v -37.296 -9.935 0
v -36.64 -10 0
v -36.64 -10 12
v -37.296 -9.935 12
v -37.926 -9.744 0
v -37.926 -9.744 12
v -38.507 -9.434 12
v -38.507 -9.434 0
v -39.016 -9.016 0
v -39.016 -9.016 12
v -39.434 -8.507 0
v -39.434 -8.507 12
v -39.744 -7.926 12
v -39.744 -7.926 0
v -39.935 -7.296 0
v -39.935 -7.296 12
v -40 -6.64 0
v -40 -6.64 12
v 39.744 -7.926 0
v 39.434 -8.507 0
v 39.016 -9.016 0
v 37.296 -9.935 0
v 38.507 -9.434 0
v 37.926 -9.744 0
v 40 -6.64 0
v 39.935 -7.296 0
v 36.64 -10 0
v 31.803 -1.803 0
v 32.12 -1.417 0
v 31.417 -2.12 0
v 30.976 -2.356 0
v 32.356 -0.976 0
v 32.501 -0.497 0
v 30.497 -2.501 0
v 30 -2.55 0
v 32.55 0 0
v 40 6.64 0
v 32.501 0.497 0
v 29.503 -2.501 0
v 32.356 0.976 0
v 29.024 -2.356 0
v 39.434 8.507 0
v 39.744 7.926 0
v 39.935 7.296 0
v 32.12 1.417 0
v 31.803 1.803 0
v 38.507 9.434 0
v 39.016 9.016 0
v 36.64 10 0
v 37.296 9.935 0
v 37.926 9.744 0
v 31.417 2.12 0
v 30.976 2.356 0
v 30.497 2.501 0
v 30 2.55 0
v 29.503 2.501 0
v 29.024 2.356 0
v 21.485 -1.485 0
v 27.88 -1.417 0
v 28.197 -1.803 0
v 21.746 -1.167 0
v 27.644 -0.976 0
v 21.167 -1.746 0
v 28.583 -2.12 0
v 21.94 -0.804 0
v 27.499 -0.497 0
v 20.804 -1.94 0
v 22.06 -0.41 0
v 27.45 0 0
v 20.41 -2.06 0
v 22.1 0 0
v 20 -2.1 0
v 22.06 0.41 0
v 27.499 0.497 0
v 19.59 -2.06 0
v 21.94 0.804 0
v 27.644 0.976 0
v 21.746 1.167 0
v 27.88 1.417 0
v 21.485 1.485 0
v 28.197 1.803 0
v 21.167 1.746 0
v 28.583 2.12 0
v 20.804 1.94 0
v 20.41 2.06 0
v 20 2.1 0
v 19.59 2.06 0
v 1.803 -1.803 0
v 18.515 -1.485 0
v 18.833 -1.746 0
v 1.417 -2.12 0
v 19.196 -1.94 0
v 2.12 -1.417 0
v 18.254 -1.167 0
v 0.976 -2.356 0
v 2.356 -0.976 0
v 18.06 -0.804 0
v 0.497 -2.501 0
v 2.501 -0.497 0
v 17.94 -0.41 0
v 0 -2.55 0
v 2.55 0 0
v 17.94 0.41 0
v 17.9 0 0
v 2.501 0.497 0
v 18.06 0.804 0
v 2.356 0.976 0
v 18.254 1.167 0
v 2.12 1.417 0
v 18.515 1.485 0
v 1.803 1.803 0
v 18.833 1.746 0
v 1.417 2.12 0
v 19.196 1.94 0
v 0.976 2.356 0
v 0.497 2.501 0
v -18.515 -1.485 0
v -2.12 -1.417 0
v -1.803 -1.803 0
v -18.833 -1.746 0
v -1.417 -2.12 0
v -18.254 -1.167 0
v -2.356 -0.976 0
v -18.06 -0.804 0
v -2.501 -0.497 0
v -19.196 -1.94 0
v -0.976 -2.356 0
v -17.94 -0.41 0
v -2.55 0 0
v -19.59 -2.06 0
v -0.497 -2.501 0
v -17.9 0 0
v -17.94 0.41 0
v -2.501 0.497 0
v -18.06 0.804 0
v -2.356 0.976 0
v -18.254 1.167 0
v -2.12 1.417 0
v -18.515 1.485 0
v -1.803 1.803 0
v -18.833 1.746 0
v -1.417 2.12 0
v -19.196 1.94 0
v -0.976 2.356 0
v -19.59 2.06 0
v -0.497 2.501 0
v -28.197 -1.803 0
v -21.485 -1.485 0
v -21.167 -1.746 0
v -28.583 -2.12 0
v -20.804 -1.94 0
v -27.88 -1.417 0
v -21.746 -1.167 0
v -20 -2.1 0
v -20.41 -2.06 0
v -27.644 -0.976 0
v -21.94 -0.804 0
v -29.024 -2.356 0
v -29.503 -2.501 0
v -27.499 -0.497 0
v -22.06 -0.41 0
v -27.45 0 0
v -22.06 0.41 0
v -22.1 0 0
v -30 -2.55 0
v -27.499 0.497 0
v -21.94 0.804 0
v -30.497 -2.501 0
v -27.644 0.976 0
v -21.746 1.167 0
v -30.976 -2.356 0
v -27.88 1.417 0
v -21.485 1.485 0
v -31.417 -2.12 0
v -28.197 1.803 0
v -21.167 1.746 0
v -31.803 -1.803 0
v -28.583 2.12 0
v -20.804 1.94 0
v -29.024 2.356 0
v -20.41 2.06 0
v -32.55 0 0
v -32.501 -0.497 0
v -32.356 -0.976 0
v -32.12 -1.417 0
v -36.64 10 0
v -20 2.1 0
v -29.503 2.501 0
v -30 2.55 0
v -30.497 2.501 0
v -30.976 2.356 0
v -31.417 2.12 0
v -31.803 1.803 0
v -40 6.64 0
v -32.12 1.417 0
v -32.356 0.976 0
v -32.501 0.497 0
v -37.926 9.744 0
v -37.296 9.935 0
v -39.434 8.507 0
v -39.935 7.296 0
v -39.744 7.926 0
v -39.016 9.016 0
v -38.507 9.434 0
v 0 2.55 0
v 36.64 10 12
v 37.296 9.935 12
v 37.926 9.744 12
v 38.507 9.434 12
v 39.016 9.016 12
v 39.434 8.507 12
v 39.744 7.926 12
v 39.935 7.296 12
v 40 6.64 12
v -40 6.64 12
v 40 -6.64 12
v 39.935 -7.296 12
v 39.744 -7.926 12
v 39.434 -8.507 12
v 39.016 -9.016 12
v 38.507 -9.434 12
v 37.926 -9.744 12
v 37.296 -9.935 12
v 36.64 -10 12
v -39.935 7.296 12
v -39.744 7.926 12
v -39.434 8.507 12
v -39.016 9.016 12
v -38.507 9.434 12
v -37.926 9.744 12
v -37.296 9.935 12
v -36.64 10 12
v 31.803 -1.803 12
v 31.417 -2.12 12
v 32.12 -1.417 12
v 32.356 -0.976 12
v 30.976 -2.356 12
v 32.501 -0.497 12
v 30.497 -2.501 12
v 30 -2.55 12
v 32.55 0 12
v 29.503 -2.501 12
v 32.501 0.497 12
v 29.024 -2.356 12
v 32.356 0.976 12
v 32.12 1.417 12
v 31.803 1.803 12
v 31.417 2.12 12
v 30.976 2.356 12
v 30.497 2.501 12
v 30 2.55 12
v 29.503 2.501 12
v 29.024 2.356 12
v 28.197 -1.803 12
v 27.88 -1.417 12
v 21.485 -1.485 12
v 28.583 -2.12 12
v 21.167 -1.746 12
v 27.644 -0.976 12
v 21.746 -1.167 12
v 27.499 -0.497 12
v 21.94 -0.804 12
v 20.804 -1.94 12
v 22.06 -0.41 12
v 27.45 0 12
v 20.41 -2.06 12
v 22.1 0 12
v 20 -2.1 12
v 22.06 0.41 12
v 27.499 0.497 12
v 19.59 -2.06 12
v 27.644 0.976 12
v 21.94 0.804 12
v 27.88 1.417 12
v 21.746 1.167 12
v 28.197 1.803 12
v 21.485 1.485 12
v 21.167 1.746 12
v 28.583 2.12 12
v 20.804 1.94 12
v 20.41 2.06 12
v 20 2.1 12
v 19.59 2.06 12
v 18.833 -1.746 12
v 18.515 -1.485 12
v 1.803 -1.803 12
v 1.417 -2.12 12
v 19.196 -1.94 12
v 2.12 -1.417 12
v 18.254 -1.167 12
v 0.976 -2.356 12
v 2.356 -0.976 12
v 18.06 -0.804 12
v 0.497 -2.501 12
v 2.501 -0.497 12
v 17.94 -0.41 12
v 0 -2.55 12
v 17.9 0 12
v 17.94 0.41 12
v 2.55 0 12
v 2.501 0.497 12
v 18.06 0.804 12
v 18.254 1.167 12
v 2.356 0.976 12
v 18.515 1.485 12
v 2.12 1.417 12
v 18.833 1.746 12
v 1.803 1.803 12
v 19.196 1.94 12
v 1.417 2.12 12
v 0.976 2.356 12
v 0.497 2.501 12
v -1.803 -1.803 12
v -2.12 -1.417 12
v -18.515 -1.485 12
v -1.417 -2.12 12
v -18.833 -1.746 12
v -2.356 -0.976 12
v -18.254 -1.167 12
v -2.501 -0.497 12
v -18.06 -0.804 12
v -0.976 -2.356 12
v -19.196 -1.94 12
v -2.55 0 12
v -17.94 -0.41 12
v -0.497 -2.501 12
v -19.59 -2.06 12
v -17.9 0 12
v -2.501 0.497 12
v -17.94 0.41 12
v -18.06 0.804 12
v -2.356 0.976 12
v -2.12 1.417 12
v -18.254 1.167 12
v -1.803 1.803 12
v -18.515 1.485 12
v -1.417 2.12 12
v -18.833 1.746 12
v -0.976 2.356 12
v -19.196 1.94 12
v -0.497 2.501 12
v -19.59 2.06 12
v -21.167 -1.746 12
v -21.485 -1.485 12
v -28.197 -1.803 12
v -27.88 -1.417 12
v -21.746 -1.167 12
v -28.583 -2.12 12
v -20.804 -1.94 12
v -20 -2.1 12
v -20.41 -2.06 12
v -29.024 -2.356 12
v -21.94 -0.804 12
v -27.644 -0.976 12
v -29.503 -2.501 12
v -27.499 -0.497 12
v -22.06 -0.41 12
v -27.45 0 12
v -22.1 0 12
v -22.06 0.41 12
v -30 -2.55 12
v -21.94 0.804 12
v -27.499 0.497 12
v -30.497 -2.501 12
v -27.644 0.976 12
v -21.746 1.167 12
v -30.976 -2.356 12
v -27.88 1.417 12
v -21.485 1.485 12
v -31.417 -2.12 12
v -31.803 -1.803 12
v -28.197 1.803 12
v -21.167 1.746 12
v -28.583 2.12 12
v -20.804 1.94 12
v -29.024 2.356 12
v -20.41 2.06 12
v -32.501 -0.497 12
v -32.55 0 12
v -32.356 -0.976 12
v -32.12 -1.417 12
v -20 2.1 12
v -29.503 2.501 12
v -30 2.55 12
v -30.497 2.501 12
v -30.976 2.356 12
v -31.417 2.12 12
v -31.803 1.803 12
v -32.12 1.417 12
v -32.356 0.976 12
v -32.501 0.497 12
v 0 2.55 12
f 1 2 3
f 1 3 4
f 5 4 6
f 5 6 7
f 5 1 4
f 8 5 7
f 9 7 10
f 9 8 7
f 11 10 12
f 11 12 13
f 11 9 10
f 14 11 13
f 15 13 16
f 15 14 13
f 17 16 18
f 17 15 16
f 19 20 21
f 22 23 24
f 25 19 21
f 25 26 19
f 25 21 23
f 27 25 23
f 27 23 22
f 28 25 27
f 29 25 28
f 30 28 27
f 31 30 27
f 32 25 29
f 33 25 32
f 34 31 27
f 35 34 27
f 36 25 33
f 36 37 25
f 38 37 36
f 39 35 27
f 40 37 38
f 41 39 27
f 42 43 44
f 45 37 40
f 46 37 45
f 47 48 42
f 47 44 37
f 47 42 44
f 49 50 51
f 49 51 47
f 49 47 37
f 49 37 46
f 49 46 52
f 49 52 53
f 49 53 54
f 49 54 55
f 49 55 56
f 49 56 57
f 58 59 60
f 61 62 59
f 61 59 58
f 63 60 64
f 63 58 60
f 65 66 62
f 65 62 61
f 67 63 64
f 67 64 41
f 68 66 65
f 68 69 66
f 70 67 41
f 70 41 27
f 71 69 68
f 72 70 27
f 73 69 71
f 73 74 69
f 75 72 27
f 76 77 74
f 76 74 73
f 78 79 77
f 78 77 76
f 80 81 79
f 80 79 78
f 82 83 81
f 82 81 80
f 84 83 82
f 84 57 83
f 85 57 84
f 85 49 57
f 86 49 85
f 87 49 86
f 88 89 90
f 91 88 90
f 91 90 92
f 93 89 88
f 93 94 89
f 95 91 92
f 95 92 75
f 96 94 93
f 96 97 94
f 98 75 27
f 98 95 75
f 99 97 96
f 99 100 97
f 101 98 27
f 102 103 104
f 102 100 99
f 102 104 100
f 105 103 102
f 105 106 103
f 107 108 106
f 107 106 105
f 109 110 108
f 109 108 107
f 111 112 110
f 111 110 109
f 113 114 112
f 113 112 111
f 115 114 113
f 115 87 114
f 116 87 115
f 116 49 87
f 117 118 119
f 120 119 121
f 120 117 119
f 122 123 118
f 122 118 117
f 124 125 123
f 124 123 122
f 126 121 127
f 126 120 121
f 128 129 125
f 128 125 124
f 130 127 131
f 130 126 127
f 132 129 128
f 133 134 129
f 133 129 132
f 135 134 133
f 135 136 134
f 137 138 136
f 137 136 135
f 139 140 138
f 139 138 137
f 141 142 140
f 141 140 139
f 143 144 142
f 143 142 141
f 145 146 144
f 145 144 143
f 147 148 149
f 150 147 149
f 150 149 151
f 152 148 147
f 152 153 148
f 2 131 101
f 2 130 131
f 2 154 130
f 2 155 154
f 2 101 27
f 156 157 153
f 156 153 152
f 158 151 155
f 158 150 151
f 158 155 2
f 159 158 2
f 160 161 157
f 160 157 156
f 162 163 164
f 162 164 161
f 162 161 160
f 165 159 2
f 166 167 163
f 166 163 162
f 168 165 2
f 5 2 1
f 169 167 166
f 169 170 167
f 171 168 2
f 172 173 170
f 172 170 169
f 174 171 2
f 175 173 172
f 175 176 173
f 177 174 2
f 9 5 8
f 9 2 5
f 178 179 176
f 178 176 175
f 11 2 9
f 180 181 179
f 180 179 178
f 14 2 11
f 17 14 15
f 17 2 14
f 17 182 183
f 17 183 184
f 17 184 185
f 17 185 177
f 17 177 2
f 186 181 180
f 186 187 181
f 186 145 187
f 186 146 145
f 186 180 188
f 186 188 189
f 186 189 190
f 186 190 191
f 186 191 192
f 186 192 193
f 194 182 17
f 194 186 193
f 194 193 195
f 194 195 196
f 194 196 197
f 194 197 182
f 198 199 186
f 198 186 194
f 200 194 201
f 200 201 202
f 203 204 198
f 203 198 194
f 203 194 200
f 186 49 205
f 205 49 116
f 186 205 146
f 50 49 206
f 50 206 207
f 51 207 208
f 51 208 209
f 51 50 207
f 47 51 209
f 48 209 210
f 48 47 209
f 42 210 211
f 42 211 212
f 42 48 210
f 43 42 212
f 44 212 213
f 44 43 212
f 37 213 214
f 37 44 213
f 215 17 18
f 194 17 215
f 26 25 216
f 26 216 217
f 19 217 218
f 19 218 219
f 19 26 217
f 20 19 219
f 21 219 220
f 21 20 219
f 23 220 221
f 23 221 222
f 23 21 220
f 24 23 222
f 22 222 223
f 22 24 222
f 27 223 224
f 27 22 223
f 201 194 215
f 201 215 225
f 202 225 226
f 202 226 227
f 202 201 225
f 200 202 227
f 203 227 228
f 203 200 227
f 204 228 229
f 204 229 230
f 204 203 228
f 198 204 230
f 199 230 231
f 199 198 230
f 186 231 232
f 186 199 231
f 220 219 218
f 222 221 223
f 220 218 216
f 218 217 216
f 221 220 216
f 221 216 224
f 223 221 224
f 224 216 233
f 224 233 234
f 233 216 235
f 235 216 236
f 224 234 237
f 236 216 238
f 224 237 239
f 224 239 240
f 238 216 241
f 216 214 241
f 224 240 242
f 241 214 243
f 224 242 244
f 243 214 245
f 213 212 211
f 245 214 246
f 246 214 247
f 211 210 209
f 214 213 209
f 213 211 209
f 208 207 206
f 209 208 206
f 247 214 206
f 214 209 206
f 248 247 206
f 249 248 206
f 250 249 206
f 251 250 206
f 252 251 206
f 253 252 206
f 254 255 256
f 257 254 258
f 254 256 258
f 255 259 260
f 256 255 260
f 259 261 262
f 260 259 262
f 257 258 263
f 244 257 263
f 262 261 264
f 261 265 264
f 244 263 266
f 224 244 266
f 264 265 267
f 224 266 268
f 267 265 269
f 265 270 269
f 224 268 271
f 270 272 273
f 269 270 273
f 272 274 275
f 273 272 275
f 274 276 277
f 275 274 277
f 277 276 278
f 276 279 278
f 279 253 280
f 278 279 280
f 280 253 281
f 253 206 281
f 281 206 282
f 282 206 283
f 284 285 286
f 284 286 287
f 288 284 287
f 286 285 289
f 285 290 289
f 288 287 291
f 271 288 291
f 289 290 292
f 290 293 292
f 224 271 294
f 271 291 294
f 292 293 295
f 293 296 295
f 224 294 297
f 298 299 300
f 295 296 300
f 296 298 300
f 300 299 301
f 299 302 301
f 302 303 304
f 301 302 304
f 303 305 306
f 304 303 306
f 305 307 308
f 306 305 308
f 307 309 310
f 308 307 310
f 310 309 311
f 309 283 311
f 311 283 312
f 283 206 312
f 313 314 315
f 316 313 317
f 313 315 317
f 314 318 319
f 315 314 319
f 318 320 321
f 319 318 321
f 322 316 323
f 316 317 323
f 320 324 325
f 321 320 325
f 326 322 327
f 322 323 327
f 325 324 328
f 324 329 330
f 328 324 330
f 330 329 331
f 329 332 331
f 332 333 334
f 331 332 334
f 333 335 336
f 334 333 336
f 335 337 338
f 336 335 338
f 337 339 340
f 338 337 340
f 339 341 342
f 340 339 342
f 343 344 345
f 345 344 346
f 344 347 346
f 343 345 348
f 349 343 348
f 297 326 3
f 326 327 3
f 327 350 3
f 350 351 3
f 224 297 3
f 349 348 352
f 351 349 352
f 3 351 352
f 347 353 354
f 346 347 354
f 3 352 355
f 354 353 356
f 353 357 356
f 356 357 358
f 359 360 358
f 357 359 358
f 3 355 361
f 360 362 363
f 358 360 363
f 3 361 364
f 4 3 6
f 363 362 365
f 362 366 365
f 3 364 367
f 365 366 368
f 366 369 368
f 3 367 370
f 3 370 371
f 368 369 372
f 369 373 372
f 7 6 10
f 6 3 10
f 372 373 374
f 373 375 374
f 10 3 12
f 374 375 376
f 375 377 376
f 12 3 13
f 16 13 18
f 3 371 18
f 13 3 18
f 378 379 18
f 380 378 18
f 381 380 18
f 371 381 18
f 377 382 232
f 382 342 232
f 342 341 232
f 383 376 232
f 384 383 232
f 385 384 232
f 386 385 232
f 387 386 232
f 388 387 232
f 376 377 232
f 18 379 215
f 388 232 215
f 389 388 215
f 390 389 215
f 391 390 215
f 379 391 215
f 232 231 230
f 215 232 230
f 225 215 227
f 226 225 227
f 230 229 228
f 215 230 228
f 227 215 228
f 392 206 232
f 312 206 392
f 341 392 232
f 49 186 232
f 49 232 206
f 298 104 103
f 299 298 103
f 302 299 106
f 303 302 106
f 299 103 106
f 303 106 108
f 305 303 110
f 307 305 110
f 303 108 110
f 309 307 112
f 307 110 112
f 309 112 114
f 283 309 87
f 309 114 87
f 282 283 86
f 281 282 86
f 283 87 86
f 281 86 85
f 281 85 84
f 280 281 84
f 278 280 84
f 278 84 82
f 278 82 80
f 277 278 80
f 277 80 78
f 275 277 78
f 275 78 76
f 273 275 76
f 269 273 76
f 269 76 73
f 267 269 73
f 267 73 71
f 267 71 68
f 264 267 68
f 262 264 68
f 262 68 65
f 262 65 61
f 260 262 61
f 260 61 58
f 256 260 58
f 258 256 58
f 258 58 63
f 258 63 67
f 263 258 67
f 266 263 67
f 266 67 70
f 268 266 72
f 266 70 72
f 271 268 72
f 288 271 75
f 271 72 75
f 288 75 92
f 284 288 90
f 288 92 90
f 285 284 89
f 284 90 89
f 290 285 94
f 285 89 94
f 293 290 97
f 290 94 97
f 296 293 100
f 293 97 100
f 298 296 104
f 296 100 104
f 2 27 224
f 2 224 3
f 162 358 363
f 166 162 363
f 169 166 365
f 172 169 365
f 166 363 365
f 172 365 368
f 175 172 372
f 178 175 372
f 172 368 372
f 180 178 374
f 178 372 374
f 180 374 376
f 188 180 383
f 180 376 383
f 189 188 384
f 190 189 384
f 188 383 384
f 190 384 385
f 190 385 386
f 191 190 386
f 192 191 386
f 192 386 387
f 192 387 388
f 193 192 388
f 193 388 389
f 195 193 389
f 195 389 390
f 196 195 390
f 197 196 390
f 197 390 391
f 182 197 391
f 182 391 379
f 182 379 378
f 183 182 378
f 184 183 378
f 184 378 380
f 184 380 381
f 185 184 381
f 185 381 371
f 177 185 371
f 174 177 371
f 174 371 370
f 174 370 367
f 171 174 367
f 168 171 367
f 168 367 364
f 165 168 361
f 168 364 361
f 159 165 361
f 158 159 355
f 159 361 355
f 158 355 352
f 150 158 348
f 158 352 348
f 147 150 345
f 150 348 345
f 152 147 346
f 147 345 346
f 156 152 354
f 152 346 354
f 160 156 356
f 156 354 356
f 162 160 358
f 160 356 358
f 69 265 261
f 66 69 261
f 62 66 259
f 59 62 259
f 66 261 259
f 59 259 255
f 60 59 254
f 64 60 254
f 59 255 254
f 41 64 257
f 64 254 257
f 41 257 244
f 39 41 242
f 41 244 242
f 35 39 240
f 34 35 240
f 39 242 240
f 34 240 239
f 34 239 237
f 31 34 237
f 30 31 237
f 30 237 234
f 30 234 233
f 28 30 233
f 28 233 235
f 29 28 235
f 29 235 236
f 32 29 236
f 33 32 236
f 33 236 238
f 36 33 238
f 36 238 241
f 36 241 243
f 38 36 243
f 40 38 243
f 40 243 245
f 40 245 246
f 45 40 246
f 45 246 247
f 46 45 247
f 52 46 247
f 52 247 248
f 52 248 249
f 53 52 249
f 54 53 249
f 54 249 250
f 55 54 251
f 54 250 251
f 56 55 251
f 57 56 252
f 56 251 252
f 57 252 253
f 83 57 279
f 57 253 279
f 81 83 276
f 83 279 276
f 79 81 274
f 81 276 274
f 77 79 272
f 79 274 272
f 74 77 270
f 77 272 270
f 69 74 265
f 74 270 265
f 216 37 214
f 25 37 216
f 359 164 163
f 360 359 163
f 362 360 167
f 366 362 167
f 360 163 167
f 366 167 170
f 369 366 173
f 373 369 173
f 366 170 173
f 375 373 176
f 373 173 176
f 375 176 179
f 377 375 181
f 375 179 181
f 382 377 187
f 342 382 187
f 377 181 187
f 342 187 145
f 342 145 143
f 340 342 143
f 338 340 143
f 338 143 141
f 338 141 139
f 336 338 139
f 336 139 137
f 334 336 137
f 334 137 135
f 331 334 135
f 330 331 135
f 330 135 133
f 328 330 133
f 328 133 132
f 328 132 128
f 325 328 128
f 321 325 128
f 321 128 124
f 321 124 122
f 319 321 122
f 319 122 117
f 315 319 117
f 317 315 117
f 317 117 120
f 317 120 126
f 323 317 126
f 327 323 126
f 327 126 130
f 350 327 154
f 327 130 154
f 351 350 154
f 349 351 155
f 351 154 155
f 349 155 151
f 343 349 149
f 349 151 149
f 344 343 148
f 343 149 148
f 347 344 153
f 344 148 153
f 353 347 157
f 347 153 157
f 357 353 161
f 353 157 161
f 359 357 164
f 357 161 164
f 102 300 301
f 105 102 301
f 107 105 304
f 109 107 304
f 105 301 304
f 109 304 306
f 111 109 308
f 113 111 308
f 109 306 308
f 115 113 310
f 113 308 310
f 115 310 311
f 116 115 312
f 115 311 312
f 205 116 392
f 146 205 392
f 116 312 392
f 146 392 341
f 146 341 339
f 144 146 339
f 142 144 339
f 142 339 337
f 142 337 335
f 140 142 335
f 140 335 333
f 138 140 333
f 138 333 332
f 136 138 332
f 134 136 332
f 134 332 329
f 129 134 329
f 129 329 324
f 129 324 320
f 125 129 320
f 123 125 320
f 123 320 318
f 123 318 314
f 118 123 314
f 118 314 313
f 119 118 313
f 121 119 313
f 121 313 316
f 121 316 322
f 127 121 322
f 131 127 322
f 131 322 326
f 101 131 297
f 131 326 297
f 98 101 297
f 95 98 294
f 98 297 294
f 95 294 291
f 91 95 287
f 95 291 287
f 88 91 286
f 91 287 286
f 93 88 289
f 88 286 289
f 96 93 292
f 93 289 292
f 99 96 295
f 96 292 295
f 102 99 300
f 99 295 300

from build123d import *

# Parameters (mm, degrees)
BOSS_EXTRUDE1_DEPTH   = 12
SKETCH3_R             = 2.55
CUT_EXTRUDE2_DEPTH    = 43.941821107
M5X0_8_TAPPED_HOLE1_D = 4.2


with BuildPart() as part:
    # Sketch1 → Boss-Extrude1 (new body)
    with BuildSketch(Plane.XY):
        with BuildLine():
            Line((36.64, -10), (-36.64, -10))
            ThreePointArc((-36.64, -10), (-39.015878785, -9.015878785), (-40, -6.64))
            Line((-40, -6.64), (-40, 6.64))
            ThreePointArc((-40, 6.64), (-39.015878785, 9.015878785), (-36.64, 10))
            Line((-36.64, 10), (36.64, 10))
            ThreePointArc((36.64, 10), (39.015878785, 9.015878785), (40, 6.64))
            Line((40, 6.64), (40, -6.64))
            ThreePointArc((40, -6.64), (39.015878785, -9.015878785), (36.64, -10))
        make_face()
    extrude(amount=BOSS_EXTRUDE1_DEPTH)

    # Sketch3 → Cut-Extrude2 (cut, through all)
    with BuildSketch(Plane.XY.offset(12)):
        with Locations((-30, 0)):
            Circle(SKETCH3_R)
        with Locations(Location((30, 0, 0), (0, 0, 180))):
            Circle(SKETCH3_R)
        Circle(SKETCH3_R)
    extrude(amount=-CUT_EXTRUDE2_DEPTH, mode=Mode.SUBTRACT)

    # M5x0.8 Tapped Hole1 (through all)
    with Locations(Plane.XY.offset(12)):
        with Locations((-20, 0), (20, 0)):
            Hole(M5X0_8_TAPPED_HOLE1_D / 2)


solid = part.part
